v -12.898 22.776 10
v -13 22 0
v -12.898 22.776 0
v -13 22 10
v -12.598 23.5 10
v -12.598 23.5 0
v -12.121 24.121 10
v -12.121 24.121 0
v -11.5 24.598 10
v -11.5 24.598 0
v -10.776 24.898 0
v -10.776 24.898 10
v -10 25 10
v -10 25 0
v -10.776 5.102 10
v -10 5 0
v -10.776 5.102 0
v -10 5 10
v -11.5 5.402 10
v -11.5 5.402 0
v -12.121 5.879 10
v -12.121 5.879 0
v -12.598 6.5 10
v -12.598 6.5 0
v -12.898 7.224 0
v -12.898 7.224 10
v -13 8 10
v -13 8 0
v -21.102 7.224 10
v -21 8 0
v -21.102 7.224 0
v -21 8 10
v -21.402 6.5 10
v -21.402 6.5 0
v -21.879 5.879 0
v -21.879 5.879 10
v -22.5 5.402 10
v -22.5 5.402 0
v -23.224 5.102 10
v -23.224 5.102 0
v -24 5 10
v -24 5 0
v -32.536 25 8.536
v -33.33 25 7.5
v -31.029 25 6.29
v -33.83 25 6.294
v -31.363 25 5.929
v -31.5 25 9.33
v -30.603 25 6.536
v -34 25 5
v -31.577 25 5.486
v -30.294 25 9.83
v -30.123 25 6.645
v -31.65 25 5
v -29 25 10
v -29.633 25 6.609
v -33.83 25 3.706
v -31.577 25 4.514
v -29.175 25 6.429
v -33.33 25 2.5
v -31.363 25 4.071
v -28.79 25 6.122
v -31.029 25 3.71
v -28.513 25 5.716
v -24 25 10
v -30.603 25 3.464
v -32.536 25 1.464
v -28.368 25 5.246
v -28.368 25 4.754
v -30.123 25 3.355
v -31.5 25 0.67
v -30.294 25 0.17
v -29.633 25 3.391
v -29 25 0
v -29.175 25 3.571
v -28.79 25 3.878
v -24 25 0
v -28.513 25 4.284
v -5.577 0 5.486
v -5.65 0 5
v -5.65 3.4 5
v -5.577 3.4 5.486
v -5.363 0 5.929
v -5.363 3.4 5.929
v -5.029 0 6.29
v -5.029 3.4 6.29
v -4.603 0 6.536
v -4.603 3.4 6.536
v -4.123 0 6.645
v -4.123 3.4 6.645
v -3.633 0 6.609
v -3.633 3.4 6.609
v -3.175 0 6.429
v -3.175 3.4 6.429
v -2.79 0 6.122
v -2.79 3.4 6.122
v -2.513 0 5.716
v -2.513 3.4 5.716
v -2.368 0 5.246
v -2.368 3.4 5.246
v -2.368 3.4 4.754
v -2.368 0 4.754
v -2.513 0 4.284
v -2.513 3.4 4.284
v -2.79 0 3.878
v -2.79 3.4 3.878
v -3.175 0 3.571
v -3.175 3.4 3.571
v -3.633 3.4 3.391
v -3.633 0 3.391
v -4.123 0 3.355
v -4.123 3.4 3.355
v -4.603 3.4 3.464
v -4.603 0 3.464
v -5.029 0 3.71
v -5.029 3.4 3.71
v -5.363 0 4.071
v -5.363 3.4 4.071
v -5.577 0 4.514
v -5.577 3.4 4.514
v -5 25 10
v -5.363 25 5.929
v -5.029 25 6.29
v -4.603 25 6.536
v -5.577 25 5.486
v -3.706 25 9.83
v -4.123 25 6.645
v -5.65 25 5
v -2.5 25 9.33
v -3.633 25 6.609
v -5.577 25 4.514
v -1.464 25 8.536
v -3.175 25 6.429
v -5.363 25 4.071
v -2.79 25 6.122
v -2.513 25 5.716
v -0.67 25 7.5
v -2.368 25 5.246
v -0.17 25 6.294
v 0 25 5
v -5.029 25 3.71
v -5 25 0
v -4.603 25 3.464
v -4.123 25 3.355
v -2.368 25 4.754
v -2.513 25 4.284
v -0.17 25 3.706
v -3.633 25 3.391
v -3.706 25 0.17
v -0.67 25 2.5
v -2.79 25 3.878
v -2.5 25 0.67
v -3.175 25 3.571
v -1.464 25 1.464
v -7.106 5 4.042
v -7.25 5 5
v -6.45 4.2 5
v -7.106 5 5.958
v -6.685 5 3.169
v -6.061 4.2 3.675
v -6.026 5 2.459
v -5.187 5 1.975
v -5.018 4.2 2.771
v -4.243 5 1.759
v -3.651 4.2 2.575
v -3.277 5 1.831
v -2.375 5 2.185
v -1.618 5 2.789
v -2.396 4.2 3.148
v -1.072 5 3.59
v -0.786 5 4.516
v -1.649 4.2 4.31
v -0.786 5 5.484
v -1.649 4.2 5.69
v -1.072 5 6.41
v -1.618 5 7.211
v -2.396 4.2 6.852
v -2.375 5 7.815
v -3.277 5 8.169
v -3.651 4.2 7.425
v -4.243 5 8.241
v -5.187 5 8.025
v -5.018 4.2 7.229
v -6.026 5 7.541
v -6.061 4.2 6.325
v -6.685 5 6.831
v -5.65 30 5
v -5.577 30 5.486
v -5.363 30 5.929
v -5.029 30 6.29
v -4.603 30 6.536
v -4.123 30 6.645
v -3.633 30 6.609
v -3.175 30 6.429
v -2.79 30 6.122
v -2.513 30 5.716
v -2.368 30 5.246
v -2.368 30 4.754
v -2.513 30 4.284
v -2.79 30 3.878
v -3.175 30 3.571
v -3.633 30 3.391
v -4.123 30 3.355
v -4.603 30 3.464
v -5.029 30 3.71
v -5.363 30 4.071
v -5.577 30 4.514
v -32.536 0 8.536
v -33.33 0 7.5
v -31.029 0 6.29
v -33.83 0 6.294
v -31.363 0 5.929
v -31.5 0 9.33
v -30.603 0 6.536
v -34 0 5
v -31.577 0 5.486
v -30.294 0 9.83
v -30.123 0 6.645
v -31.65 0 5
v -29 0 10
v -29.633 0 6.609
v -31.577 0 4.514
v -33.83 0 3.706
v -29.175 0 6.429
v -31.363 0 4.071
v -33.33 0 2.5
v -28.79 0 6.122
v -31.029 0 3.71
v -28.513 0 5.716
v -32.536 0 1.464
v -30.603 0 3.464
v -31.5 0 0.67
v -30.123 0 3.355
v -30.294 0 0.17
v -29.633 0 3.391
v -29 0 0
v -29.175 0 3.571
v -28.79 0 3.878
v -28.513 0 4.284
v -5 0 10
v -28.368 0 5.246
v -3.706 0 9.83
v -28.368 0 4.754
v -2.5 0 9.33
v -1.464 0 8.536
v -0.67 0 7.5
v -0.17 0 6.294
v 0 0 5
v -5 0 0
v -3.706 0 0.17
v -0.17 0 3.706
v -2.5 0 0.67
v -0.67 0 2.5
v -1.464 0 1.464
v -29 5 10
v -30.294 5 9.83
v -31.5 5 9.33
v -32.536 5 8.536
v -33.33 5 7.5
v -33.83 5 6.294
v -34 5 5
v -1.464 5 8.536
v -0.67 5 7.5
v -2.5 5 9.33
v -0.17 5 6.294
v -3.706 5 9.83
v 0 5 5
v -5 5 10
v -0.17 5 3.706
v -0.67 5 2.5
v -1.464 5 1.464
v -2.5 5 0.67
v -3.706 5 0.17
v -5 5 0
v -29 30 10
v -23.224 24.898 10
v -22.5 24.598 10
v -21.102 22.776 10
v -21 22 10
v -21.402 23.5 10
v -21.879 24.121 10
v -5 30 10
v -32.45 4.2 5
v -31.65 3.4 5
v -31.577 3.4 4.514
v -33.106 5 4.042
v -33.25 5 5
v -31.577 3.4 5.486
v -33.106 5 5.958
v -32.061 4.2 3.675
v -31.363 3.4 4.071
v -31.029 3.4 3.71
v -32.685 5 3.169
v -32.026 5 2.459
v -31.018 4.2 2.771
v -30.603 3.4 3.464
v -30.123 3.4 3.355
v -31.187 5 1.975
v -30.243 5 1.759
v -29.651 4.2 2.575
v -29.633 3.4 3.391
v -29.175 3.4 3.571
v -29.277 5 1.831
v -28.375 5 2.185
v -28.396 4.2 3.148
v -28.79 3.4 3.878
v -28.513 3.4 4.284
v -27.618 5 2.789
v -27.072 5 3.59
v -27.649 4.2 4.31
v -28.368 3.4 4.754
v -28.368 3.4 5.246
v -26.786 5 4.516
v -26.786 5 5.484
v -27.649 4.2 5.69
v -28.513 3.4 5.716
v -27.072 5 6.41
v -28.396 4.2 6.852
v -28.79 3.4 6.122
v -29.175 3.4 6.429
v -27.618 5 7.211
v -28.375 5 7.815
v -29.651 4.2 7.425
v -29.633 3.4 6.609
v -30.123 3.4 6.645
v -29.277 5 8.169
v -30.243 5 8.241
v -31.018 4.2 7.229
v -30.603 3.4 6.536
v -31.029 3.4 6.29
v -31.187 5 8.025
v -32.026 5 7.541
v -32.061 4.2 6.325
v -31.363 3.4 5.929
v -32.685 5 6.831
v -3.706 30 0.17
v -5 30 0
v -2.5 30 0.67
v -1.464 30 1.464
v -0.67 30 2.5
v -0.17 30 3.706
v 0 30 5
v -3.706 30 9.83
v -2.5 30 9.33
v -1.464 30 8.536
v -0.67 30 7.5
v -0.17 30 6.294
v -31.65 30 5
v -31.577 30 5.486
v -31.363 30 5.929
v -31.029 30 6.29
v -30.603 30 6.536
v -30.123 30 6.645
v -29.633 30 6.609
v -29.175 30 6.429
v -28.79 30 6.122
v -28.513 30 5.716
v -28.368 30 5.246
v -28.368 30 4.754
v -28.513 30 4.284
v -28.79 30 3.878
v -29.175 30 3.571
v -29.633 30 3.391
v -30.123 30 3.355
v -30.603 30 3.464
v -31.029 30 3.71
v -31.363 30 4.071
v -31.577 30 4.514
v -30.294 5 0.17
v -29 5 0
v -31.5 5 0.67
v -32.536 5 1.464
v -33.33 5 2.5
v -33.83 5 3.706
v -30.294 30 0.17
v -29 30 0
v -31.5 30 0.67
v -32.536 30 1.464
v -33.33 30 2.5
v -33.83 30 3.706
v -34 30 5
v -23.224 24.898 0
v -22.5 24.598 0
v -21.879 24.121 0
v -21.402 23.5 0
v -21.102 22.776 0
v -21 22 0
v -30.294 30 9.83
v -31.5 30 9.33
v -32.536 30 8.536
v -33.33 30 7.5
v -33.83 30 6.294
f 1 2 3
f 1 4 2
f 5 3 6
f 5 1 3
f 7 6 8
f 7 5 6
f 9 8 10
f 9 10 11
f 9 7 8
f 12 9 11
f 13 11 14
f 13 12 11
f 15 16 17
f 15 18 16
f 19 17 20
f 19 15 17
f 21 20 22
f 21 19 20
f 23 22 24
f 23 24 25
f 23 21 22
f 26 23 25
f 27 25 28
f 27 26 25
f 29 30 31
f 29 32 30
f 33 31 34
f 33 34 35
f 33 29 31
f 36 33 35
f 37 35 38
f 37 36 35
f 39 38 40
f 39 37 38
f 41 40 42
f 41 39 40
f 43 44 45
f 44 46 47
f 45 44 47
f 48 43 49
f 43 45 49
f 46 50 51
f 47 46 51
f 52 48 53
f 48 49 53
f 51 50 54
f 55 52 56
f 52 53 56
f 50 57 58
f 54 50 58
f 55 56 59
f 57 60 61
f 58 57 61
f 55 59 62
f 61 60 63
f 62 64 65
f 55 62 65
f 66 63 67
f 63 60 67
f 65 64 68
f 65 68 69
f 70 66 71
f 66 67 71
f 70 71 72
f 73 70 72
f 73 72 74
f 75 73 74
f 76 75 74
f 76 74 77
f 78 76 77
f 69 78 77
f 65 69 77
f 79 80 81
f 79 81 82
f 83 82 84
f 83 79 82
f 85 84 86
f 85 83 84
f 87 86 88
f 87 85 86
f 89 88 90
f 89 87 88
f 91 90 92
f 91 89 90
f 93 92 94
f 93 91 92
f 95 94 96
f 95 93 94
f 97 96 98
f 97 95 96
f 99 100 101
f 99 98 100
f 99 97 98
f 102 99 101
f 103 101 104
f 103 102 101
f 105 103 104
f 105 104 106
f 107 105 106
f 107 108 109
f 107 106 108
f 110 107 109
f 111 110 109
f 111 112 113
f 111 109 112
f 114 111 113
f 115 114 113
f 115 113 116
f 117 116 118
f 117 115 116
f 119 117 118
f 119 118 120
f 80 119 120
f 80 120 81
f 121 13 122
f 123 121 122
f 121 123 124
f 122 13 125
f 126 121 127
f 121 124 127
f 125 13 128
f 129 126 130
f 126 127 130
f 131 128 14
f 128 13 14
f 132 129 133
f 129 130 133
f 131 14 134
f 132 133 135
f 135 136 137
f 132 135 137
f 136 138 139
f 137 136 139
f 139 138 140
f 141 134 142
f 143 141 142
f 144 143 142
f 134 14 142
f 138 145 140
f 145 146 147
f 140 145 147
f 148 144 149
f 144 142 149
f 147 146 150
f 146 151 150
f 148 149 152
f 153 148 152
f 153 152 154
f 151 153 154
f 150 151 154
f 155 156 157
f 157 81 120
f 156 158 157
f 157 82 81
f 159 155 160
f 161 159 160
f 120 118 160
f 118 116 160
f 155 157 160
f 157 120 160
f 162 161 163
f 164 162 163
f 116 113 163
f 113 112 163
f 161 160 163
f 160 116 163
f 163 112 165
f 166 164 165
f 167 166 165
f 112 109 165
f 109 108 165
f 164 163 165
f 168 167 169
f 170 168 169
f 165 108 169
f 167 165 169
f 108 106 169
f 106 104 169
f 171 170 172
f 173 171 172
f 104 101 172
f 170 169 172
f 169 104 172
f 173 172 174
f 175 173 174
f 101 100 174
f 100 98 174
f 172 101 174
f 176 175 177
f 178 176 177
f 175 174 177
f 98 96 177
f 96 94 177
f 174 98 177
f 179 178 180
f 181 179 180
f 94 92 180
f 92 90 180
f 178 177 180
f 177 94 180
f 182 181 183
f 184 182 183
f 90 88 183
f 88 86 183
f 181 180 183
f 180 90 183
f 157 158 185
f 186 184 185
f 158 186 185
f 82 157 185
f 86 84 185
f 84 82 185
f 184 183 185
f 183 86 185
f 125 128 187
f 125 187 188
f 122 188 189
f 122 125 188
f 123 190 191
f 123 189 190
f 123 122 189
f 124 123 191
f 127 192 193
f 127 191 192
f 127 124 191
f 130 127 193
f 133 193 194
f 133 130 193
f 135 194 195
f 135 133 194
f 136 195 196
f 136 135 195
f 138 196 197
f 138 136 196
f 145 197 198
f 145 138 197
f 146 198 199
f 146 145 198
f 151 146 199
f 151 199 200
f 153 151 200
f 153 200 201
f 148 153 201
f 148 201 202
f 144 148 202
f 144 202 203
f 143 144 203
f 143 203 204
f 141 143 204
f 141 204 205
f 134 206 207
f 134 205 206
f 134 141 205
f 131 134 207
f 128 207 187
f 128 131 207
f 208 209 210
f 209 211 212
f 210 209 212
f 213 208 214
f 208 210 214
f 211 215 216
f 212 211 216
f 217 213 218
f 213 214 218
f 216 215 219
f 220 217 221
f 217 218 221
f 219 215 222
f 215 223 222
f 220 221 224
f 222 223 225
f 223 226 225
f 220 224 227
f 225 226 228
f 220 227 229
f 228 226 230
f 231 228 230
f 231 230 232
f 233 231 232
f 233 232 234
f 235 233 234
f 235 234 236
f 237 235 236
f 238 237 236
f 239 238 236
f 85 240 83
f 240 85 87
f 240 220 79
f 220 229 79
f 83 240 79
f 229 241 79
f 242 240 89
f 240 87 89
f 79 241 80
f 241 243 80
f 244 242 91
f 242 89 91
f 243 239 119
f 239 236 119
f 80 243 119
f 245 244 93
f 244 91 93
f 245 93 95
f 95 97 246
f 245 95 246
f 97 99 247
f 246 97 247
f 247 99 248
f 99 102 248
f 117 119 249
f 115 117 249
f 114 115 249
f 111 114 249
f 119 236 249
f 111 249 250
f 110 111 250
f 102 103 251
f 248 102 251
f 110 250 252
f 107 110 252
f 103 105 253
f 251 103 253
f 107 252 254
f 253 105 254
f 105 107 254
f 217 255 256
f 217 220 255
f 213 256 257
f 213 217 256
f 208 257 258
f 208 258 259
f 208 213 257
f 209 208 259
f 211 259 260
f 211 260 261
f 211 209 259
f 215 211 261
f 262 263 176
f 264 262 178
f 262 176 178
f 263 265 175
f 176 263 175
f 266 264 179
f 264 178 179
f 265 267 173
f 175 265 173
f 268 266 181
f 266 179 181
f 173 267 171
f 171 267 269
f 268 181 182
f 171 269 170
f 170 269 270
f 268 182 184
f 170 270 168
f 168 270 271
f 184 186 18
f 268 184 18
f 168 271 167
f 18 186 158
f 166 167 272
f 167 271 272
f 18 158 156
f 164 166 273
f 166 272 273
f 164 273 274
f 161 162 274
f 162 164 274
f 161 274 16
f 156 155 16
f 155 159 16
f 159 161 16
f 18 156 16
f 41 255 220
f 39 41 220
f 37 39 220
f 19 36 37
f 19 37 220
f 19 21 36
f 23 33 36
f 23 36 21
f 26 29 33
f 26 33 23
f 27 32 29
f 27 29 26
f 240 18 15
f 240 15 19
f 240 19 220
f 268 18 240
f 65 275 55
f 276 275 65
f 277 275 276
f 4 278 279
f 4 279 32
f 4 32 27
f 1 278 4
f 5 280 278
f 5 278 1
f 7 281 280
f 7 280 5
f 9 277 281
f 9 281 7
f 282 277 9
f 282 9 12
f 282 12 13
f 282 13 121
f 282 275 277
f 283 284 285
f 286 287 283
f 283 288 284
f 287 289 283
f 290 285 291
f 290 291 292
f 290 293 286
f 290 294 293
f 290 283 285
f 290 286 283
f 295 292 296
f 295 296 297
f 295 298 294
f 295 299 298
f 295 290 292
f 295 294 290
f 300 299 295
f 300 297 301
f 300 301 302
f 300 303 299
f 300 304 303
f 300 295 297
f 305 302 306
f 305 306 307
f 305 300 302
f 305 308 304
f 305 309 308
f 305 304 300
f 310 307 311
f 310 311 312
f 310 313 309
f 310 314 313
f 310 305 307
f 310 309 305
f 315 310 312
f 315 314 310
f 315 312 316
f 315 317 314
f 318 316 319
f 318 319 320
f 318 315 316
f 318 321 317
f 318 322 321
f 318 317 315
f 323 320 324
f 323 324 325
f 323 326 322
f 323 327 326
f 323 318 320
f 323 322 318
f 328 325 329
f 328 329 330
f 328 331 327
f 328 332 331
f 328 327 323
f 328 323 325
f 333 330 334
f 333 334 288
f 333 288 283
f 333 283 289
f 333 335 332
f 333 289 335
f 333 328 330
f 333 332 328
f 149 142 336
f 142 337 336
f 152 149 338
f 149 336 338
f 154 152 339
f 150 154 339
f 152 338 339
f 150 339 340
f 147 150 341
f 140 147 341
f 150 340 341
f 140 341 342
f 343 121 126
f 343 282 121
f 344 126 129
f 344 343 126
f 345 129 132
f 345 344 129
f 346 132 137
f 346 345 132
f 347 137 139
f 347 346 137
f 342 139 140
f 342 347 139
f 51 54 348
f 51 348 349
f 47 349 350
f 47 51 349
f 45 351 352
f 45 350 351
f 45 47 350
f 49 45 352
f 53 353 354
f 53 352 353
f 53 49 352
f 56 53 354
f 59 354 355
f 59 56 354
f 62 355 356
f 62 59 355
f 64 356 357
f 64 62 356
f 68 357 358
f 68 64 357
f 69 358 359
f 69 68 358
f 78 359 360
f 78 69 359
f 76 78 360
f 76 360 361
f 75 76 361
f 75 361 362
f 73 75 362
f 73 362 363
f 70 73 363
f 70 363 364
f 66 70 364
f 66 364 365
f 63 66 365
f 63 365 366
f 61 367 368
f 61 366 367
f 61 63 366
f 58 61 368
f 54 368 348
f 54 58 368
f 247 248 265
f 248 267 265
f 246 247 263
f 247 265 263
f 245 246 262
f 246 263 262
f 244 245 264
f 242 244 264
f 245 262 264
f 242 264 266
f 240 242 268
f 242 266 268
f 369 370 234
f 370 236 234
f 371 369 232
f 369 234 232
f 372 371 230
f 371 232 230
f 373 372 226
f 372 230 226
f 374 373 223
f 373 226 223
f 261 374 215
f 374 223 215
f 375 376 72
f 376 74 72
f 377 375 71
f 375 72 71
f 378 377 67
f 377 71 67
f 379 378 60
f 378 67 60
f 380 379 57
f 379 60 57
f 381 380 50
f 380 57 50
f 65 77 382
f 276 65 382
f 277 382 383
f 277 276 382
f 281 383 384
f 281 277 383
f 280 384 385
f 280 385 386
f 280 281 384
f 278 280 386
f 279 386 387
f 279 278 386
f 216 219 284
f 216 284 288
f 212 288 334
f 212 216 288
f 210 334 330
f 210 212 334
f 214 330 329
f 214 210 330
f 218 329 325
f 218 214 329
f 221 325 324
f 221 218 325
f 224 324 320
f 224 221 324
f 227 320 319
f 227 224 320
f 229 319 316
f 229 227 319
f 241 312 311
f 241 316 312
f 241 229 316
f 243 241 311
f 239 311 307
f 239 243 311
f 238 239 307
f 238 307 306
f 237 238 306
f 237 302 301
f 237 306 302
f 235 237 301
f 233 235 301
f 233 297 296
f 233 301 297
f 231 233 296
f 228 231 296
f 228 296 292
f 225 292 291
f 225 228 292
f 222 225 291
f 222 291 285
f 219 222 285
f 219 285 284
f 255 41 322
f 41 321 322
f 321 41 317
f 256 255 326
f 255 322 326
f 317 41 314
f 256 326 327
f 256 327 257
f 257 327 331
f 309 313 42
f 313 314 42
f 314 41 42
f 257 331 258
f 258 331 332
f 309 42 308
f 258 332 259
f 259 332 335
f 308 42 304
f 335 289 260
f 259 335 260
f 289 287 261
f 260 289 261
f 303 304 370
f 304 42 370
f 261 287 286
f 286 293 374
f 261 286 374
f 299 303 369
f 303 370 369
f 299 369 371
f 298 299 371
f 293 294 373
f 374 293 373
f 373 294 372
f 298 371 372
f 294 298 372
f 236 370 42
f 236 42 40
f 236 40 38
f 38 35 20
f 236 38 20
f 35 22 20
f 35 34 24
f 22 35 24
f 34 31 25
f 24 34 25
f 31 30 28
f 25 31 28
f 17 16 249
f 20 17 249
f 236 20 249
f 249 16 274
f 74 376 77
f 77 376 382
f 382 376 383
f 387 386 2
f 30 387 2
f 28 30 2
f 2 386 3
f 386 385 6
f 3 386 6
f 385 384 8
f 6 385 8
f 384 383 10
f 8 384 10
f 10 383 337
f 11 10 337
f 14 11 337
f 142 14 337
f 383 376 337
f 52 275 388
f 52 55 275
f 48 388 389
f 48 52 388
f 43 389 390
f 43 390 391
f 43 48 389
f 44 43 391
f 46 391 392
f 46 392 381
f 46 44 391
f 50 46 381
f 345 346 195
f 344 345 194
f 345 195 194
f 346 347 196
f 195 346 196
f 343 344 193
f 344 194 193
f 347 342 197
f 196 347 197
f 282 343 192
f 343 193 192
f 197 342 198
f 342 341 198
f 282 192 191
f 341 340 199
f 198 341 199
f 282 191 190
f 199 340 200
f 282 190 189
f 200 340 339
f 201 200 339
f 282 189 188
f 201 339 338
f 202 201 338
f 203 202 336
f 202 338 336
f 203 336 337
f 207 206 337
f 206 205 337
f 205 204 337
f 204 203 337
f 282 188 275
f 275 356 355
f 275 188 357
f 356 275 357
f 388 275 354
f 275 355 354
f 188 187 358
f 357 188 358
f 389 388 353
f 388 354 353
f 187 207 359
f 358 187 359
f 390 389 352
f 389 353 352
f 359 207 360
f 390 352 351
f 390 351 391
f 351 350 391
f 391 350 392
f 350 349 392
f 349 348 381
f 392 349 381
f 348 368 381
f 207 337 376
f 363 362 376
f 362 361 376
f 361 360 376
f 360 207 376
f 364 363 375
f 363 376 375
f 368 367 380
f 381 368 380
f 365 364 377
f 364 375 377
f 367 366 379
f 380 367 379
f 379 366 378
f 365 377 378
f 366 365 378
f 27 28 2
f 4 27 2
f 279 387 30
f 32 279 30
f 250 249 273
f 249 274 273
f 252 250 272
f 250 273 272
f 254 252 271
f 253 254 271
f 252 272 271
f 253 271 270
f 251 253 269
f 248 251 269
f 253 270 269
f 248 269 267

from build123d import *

# Parameters (mm, degrees)
BOSS_EXTRUDE1_DEPTH     = 10
CUT_EXTRUDE1_DEPTH      = 47.432747065
CUT_EXTRUDE1_DEPTH_BACK = 47.432747065
SKETCH2_R               = 1.65
CHAMFER1_SIZE           = 1.6
FILLET1_R               = 3
FILLET3_R               = 5


with BuildPart() as part:
    # Sketch1 → Boss-Extrude1 (new body)
    with BuildSketch(Plane.XY):
        Polygon((0, 0), (0, 5), (-13, 5), (-13, 25), (0, 25), (0, 30), (-34, 30), (-34, 25), (-21, 25), (-21, 5), (-34, 5), (-34, 0), align=None)
    extrude(amount=BOSS_EXTRUDE1_DEPTH)

    # Sketch2 → Cut-Extrude1 (cut, two sides: drawn at the far end of the back side and taken through both)
    with BuildSketch(Plane(origin=(0, 30, 0), x_dir=(1, 0, 0), z_dir=(0, 1, 0)).offset(-CUT_EXTRUDE1_DEPTH_BACK)):
        with Locations(Location((-30, -5, 0), (0, 0, 180))):
            Circle(SKETCH2_R)
        with Locations(Location((-4, -5, 0), (0, 0, 180))):
            Circle(SKETCH2_R)
    extrude(amount=CUT_EXTRUDE1_DEPTH + CUT_EXTRUDE1_DEPTH_BACK, mode=Mode.SUBTRACT)

    # Chamfer1
    chamfer1_edges = [part.edges().sort_by_distance(p)[0] for p in [
        (-28.35, 5, 5),
        (-2.35, 5, 5),
    ]]
    chamfer(chamfer1_edges, length=CHAMFER1_SIZE)

    # Fillet1
    fillet1_edges = [part.edges().sort_by_distance(p)[0] for p in [
        (-21, 5, 5),
        (-21, 25, 5),
        (-13, 25, 5),
        (-13, 5, 5),
    ]]
    fillet(fillet1_edges, radius=FILLET1_R)

    # Fillet3
    fillet3_edges = [part.edges().sort_by_distance(p)[0] for p in [
        (-34, 2.5, 0),
        (-34, 2.5, 10),
        (0, 2.5, 10),
        (0, 2.5, 0),
        (0, 27.5, 0),
        (0, 27.5, 10),
        (-34, 27.5, 0),
        (-34, 27.5, 10),
    ]]
    fillet(fillet3_edges, radius=FILLET3_R - 0.0001)  # a hair under: the kernel refuses the full size


solid = part.part
